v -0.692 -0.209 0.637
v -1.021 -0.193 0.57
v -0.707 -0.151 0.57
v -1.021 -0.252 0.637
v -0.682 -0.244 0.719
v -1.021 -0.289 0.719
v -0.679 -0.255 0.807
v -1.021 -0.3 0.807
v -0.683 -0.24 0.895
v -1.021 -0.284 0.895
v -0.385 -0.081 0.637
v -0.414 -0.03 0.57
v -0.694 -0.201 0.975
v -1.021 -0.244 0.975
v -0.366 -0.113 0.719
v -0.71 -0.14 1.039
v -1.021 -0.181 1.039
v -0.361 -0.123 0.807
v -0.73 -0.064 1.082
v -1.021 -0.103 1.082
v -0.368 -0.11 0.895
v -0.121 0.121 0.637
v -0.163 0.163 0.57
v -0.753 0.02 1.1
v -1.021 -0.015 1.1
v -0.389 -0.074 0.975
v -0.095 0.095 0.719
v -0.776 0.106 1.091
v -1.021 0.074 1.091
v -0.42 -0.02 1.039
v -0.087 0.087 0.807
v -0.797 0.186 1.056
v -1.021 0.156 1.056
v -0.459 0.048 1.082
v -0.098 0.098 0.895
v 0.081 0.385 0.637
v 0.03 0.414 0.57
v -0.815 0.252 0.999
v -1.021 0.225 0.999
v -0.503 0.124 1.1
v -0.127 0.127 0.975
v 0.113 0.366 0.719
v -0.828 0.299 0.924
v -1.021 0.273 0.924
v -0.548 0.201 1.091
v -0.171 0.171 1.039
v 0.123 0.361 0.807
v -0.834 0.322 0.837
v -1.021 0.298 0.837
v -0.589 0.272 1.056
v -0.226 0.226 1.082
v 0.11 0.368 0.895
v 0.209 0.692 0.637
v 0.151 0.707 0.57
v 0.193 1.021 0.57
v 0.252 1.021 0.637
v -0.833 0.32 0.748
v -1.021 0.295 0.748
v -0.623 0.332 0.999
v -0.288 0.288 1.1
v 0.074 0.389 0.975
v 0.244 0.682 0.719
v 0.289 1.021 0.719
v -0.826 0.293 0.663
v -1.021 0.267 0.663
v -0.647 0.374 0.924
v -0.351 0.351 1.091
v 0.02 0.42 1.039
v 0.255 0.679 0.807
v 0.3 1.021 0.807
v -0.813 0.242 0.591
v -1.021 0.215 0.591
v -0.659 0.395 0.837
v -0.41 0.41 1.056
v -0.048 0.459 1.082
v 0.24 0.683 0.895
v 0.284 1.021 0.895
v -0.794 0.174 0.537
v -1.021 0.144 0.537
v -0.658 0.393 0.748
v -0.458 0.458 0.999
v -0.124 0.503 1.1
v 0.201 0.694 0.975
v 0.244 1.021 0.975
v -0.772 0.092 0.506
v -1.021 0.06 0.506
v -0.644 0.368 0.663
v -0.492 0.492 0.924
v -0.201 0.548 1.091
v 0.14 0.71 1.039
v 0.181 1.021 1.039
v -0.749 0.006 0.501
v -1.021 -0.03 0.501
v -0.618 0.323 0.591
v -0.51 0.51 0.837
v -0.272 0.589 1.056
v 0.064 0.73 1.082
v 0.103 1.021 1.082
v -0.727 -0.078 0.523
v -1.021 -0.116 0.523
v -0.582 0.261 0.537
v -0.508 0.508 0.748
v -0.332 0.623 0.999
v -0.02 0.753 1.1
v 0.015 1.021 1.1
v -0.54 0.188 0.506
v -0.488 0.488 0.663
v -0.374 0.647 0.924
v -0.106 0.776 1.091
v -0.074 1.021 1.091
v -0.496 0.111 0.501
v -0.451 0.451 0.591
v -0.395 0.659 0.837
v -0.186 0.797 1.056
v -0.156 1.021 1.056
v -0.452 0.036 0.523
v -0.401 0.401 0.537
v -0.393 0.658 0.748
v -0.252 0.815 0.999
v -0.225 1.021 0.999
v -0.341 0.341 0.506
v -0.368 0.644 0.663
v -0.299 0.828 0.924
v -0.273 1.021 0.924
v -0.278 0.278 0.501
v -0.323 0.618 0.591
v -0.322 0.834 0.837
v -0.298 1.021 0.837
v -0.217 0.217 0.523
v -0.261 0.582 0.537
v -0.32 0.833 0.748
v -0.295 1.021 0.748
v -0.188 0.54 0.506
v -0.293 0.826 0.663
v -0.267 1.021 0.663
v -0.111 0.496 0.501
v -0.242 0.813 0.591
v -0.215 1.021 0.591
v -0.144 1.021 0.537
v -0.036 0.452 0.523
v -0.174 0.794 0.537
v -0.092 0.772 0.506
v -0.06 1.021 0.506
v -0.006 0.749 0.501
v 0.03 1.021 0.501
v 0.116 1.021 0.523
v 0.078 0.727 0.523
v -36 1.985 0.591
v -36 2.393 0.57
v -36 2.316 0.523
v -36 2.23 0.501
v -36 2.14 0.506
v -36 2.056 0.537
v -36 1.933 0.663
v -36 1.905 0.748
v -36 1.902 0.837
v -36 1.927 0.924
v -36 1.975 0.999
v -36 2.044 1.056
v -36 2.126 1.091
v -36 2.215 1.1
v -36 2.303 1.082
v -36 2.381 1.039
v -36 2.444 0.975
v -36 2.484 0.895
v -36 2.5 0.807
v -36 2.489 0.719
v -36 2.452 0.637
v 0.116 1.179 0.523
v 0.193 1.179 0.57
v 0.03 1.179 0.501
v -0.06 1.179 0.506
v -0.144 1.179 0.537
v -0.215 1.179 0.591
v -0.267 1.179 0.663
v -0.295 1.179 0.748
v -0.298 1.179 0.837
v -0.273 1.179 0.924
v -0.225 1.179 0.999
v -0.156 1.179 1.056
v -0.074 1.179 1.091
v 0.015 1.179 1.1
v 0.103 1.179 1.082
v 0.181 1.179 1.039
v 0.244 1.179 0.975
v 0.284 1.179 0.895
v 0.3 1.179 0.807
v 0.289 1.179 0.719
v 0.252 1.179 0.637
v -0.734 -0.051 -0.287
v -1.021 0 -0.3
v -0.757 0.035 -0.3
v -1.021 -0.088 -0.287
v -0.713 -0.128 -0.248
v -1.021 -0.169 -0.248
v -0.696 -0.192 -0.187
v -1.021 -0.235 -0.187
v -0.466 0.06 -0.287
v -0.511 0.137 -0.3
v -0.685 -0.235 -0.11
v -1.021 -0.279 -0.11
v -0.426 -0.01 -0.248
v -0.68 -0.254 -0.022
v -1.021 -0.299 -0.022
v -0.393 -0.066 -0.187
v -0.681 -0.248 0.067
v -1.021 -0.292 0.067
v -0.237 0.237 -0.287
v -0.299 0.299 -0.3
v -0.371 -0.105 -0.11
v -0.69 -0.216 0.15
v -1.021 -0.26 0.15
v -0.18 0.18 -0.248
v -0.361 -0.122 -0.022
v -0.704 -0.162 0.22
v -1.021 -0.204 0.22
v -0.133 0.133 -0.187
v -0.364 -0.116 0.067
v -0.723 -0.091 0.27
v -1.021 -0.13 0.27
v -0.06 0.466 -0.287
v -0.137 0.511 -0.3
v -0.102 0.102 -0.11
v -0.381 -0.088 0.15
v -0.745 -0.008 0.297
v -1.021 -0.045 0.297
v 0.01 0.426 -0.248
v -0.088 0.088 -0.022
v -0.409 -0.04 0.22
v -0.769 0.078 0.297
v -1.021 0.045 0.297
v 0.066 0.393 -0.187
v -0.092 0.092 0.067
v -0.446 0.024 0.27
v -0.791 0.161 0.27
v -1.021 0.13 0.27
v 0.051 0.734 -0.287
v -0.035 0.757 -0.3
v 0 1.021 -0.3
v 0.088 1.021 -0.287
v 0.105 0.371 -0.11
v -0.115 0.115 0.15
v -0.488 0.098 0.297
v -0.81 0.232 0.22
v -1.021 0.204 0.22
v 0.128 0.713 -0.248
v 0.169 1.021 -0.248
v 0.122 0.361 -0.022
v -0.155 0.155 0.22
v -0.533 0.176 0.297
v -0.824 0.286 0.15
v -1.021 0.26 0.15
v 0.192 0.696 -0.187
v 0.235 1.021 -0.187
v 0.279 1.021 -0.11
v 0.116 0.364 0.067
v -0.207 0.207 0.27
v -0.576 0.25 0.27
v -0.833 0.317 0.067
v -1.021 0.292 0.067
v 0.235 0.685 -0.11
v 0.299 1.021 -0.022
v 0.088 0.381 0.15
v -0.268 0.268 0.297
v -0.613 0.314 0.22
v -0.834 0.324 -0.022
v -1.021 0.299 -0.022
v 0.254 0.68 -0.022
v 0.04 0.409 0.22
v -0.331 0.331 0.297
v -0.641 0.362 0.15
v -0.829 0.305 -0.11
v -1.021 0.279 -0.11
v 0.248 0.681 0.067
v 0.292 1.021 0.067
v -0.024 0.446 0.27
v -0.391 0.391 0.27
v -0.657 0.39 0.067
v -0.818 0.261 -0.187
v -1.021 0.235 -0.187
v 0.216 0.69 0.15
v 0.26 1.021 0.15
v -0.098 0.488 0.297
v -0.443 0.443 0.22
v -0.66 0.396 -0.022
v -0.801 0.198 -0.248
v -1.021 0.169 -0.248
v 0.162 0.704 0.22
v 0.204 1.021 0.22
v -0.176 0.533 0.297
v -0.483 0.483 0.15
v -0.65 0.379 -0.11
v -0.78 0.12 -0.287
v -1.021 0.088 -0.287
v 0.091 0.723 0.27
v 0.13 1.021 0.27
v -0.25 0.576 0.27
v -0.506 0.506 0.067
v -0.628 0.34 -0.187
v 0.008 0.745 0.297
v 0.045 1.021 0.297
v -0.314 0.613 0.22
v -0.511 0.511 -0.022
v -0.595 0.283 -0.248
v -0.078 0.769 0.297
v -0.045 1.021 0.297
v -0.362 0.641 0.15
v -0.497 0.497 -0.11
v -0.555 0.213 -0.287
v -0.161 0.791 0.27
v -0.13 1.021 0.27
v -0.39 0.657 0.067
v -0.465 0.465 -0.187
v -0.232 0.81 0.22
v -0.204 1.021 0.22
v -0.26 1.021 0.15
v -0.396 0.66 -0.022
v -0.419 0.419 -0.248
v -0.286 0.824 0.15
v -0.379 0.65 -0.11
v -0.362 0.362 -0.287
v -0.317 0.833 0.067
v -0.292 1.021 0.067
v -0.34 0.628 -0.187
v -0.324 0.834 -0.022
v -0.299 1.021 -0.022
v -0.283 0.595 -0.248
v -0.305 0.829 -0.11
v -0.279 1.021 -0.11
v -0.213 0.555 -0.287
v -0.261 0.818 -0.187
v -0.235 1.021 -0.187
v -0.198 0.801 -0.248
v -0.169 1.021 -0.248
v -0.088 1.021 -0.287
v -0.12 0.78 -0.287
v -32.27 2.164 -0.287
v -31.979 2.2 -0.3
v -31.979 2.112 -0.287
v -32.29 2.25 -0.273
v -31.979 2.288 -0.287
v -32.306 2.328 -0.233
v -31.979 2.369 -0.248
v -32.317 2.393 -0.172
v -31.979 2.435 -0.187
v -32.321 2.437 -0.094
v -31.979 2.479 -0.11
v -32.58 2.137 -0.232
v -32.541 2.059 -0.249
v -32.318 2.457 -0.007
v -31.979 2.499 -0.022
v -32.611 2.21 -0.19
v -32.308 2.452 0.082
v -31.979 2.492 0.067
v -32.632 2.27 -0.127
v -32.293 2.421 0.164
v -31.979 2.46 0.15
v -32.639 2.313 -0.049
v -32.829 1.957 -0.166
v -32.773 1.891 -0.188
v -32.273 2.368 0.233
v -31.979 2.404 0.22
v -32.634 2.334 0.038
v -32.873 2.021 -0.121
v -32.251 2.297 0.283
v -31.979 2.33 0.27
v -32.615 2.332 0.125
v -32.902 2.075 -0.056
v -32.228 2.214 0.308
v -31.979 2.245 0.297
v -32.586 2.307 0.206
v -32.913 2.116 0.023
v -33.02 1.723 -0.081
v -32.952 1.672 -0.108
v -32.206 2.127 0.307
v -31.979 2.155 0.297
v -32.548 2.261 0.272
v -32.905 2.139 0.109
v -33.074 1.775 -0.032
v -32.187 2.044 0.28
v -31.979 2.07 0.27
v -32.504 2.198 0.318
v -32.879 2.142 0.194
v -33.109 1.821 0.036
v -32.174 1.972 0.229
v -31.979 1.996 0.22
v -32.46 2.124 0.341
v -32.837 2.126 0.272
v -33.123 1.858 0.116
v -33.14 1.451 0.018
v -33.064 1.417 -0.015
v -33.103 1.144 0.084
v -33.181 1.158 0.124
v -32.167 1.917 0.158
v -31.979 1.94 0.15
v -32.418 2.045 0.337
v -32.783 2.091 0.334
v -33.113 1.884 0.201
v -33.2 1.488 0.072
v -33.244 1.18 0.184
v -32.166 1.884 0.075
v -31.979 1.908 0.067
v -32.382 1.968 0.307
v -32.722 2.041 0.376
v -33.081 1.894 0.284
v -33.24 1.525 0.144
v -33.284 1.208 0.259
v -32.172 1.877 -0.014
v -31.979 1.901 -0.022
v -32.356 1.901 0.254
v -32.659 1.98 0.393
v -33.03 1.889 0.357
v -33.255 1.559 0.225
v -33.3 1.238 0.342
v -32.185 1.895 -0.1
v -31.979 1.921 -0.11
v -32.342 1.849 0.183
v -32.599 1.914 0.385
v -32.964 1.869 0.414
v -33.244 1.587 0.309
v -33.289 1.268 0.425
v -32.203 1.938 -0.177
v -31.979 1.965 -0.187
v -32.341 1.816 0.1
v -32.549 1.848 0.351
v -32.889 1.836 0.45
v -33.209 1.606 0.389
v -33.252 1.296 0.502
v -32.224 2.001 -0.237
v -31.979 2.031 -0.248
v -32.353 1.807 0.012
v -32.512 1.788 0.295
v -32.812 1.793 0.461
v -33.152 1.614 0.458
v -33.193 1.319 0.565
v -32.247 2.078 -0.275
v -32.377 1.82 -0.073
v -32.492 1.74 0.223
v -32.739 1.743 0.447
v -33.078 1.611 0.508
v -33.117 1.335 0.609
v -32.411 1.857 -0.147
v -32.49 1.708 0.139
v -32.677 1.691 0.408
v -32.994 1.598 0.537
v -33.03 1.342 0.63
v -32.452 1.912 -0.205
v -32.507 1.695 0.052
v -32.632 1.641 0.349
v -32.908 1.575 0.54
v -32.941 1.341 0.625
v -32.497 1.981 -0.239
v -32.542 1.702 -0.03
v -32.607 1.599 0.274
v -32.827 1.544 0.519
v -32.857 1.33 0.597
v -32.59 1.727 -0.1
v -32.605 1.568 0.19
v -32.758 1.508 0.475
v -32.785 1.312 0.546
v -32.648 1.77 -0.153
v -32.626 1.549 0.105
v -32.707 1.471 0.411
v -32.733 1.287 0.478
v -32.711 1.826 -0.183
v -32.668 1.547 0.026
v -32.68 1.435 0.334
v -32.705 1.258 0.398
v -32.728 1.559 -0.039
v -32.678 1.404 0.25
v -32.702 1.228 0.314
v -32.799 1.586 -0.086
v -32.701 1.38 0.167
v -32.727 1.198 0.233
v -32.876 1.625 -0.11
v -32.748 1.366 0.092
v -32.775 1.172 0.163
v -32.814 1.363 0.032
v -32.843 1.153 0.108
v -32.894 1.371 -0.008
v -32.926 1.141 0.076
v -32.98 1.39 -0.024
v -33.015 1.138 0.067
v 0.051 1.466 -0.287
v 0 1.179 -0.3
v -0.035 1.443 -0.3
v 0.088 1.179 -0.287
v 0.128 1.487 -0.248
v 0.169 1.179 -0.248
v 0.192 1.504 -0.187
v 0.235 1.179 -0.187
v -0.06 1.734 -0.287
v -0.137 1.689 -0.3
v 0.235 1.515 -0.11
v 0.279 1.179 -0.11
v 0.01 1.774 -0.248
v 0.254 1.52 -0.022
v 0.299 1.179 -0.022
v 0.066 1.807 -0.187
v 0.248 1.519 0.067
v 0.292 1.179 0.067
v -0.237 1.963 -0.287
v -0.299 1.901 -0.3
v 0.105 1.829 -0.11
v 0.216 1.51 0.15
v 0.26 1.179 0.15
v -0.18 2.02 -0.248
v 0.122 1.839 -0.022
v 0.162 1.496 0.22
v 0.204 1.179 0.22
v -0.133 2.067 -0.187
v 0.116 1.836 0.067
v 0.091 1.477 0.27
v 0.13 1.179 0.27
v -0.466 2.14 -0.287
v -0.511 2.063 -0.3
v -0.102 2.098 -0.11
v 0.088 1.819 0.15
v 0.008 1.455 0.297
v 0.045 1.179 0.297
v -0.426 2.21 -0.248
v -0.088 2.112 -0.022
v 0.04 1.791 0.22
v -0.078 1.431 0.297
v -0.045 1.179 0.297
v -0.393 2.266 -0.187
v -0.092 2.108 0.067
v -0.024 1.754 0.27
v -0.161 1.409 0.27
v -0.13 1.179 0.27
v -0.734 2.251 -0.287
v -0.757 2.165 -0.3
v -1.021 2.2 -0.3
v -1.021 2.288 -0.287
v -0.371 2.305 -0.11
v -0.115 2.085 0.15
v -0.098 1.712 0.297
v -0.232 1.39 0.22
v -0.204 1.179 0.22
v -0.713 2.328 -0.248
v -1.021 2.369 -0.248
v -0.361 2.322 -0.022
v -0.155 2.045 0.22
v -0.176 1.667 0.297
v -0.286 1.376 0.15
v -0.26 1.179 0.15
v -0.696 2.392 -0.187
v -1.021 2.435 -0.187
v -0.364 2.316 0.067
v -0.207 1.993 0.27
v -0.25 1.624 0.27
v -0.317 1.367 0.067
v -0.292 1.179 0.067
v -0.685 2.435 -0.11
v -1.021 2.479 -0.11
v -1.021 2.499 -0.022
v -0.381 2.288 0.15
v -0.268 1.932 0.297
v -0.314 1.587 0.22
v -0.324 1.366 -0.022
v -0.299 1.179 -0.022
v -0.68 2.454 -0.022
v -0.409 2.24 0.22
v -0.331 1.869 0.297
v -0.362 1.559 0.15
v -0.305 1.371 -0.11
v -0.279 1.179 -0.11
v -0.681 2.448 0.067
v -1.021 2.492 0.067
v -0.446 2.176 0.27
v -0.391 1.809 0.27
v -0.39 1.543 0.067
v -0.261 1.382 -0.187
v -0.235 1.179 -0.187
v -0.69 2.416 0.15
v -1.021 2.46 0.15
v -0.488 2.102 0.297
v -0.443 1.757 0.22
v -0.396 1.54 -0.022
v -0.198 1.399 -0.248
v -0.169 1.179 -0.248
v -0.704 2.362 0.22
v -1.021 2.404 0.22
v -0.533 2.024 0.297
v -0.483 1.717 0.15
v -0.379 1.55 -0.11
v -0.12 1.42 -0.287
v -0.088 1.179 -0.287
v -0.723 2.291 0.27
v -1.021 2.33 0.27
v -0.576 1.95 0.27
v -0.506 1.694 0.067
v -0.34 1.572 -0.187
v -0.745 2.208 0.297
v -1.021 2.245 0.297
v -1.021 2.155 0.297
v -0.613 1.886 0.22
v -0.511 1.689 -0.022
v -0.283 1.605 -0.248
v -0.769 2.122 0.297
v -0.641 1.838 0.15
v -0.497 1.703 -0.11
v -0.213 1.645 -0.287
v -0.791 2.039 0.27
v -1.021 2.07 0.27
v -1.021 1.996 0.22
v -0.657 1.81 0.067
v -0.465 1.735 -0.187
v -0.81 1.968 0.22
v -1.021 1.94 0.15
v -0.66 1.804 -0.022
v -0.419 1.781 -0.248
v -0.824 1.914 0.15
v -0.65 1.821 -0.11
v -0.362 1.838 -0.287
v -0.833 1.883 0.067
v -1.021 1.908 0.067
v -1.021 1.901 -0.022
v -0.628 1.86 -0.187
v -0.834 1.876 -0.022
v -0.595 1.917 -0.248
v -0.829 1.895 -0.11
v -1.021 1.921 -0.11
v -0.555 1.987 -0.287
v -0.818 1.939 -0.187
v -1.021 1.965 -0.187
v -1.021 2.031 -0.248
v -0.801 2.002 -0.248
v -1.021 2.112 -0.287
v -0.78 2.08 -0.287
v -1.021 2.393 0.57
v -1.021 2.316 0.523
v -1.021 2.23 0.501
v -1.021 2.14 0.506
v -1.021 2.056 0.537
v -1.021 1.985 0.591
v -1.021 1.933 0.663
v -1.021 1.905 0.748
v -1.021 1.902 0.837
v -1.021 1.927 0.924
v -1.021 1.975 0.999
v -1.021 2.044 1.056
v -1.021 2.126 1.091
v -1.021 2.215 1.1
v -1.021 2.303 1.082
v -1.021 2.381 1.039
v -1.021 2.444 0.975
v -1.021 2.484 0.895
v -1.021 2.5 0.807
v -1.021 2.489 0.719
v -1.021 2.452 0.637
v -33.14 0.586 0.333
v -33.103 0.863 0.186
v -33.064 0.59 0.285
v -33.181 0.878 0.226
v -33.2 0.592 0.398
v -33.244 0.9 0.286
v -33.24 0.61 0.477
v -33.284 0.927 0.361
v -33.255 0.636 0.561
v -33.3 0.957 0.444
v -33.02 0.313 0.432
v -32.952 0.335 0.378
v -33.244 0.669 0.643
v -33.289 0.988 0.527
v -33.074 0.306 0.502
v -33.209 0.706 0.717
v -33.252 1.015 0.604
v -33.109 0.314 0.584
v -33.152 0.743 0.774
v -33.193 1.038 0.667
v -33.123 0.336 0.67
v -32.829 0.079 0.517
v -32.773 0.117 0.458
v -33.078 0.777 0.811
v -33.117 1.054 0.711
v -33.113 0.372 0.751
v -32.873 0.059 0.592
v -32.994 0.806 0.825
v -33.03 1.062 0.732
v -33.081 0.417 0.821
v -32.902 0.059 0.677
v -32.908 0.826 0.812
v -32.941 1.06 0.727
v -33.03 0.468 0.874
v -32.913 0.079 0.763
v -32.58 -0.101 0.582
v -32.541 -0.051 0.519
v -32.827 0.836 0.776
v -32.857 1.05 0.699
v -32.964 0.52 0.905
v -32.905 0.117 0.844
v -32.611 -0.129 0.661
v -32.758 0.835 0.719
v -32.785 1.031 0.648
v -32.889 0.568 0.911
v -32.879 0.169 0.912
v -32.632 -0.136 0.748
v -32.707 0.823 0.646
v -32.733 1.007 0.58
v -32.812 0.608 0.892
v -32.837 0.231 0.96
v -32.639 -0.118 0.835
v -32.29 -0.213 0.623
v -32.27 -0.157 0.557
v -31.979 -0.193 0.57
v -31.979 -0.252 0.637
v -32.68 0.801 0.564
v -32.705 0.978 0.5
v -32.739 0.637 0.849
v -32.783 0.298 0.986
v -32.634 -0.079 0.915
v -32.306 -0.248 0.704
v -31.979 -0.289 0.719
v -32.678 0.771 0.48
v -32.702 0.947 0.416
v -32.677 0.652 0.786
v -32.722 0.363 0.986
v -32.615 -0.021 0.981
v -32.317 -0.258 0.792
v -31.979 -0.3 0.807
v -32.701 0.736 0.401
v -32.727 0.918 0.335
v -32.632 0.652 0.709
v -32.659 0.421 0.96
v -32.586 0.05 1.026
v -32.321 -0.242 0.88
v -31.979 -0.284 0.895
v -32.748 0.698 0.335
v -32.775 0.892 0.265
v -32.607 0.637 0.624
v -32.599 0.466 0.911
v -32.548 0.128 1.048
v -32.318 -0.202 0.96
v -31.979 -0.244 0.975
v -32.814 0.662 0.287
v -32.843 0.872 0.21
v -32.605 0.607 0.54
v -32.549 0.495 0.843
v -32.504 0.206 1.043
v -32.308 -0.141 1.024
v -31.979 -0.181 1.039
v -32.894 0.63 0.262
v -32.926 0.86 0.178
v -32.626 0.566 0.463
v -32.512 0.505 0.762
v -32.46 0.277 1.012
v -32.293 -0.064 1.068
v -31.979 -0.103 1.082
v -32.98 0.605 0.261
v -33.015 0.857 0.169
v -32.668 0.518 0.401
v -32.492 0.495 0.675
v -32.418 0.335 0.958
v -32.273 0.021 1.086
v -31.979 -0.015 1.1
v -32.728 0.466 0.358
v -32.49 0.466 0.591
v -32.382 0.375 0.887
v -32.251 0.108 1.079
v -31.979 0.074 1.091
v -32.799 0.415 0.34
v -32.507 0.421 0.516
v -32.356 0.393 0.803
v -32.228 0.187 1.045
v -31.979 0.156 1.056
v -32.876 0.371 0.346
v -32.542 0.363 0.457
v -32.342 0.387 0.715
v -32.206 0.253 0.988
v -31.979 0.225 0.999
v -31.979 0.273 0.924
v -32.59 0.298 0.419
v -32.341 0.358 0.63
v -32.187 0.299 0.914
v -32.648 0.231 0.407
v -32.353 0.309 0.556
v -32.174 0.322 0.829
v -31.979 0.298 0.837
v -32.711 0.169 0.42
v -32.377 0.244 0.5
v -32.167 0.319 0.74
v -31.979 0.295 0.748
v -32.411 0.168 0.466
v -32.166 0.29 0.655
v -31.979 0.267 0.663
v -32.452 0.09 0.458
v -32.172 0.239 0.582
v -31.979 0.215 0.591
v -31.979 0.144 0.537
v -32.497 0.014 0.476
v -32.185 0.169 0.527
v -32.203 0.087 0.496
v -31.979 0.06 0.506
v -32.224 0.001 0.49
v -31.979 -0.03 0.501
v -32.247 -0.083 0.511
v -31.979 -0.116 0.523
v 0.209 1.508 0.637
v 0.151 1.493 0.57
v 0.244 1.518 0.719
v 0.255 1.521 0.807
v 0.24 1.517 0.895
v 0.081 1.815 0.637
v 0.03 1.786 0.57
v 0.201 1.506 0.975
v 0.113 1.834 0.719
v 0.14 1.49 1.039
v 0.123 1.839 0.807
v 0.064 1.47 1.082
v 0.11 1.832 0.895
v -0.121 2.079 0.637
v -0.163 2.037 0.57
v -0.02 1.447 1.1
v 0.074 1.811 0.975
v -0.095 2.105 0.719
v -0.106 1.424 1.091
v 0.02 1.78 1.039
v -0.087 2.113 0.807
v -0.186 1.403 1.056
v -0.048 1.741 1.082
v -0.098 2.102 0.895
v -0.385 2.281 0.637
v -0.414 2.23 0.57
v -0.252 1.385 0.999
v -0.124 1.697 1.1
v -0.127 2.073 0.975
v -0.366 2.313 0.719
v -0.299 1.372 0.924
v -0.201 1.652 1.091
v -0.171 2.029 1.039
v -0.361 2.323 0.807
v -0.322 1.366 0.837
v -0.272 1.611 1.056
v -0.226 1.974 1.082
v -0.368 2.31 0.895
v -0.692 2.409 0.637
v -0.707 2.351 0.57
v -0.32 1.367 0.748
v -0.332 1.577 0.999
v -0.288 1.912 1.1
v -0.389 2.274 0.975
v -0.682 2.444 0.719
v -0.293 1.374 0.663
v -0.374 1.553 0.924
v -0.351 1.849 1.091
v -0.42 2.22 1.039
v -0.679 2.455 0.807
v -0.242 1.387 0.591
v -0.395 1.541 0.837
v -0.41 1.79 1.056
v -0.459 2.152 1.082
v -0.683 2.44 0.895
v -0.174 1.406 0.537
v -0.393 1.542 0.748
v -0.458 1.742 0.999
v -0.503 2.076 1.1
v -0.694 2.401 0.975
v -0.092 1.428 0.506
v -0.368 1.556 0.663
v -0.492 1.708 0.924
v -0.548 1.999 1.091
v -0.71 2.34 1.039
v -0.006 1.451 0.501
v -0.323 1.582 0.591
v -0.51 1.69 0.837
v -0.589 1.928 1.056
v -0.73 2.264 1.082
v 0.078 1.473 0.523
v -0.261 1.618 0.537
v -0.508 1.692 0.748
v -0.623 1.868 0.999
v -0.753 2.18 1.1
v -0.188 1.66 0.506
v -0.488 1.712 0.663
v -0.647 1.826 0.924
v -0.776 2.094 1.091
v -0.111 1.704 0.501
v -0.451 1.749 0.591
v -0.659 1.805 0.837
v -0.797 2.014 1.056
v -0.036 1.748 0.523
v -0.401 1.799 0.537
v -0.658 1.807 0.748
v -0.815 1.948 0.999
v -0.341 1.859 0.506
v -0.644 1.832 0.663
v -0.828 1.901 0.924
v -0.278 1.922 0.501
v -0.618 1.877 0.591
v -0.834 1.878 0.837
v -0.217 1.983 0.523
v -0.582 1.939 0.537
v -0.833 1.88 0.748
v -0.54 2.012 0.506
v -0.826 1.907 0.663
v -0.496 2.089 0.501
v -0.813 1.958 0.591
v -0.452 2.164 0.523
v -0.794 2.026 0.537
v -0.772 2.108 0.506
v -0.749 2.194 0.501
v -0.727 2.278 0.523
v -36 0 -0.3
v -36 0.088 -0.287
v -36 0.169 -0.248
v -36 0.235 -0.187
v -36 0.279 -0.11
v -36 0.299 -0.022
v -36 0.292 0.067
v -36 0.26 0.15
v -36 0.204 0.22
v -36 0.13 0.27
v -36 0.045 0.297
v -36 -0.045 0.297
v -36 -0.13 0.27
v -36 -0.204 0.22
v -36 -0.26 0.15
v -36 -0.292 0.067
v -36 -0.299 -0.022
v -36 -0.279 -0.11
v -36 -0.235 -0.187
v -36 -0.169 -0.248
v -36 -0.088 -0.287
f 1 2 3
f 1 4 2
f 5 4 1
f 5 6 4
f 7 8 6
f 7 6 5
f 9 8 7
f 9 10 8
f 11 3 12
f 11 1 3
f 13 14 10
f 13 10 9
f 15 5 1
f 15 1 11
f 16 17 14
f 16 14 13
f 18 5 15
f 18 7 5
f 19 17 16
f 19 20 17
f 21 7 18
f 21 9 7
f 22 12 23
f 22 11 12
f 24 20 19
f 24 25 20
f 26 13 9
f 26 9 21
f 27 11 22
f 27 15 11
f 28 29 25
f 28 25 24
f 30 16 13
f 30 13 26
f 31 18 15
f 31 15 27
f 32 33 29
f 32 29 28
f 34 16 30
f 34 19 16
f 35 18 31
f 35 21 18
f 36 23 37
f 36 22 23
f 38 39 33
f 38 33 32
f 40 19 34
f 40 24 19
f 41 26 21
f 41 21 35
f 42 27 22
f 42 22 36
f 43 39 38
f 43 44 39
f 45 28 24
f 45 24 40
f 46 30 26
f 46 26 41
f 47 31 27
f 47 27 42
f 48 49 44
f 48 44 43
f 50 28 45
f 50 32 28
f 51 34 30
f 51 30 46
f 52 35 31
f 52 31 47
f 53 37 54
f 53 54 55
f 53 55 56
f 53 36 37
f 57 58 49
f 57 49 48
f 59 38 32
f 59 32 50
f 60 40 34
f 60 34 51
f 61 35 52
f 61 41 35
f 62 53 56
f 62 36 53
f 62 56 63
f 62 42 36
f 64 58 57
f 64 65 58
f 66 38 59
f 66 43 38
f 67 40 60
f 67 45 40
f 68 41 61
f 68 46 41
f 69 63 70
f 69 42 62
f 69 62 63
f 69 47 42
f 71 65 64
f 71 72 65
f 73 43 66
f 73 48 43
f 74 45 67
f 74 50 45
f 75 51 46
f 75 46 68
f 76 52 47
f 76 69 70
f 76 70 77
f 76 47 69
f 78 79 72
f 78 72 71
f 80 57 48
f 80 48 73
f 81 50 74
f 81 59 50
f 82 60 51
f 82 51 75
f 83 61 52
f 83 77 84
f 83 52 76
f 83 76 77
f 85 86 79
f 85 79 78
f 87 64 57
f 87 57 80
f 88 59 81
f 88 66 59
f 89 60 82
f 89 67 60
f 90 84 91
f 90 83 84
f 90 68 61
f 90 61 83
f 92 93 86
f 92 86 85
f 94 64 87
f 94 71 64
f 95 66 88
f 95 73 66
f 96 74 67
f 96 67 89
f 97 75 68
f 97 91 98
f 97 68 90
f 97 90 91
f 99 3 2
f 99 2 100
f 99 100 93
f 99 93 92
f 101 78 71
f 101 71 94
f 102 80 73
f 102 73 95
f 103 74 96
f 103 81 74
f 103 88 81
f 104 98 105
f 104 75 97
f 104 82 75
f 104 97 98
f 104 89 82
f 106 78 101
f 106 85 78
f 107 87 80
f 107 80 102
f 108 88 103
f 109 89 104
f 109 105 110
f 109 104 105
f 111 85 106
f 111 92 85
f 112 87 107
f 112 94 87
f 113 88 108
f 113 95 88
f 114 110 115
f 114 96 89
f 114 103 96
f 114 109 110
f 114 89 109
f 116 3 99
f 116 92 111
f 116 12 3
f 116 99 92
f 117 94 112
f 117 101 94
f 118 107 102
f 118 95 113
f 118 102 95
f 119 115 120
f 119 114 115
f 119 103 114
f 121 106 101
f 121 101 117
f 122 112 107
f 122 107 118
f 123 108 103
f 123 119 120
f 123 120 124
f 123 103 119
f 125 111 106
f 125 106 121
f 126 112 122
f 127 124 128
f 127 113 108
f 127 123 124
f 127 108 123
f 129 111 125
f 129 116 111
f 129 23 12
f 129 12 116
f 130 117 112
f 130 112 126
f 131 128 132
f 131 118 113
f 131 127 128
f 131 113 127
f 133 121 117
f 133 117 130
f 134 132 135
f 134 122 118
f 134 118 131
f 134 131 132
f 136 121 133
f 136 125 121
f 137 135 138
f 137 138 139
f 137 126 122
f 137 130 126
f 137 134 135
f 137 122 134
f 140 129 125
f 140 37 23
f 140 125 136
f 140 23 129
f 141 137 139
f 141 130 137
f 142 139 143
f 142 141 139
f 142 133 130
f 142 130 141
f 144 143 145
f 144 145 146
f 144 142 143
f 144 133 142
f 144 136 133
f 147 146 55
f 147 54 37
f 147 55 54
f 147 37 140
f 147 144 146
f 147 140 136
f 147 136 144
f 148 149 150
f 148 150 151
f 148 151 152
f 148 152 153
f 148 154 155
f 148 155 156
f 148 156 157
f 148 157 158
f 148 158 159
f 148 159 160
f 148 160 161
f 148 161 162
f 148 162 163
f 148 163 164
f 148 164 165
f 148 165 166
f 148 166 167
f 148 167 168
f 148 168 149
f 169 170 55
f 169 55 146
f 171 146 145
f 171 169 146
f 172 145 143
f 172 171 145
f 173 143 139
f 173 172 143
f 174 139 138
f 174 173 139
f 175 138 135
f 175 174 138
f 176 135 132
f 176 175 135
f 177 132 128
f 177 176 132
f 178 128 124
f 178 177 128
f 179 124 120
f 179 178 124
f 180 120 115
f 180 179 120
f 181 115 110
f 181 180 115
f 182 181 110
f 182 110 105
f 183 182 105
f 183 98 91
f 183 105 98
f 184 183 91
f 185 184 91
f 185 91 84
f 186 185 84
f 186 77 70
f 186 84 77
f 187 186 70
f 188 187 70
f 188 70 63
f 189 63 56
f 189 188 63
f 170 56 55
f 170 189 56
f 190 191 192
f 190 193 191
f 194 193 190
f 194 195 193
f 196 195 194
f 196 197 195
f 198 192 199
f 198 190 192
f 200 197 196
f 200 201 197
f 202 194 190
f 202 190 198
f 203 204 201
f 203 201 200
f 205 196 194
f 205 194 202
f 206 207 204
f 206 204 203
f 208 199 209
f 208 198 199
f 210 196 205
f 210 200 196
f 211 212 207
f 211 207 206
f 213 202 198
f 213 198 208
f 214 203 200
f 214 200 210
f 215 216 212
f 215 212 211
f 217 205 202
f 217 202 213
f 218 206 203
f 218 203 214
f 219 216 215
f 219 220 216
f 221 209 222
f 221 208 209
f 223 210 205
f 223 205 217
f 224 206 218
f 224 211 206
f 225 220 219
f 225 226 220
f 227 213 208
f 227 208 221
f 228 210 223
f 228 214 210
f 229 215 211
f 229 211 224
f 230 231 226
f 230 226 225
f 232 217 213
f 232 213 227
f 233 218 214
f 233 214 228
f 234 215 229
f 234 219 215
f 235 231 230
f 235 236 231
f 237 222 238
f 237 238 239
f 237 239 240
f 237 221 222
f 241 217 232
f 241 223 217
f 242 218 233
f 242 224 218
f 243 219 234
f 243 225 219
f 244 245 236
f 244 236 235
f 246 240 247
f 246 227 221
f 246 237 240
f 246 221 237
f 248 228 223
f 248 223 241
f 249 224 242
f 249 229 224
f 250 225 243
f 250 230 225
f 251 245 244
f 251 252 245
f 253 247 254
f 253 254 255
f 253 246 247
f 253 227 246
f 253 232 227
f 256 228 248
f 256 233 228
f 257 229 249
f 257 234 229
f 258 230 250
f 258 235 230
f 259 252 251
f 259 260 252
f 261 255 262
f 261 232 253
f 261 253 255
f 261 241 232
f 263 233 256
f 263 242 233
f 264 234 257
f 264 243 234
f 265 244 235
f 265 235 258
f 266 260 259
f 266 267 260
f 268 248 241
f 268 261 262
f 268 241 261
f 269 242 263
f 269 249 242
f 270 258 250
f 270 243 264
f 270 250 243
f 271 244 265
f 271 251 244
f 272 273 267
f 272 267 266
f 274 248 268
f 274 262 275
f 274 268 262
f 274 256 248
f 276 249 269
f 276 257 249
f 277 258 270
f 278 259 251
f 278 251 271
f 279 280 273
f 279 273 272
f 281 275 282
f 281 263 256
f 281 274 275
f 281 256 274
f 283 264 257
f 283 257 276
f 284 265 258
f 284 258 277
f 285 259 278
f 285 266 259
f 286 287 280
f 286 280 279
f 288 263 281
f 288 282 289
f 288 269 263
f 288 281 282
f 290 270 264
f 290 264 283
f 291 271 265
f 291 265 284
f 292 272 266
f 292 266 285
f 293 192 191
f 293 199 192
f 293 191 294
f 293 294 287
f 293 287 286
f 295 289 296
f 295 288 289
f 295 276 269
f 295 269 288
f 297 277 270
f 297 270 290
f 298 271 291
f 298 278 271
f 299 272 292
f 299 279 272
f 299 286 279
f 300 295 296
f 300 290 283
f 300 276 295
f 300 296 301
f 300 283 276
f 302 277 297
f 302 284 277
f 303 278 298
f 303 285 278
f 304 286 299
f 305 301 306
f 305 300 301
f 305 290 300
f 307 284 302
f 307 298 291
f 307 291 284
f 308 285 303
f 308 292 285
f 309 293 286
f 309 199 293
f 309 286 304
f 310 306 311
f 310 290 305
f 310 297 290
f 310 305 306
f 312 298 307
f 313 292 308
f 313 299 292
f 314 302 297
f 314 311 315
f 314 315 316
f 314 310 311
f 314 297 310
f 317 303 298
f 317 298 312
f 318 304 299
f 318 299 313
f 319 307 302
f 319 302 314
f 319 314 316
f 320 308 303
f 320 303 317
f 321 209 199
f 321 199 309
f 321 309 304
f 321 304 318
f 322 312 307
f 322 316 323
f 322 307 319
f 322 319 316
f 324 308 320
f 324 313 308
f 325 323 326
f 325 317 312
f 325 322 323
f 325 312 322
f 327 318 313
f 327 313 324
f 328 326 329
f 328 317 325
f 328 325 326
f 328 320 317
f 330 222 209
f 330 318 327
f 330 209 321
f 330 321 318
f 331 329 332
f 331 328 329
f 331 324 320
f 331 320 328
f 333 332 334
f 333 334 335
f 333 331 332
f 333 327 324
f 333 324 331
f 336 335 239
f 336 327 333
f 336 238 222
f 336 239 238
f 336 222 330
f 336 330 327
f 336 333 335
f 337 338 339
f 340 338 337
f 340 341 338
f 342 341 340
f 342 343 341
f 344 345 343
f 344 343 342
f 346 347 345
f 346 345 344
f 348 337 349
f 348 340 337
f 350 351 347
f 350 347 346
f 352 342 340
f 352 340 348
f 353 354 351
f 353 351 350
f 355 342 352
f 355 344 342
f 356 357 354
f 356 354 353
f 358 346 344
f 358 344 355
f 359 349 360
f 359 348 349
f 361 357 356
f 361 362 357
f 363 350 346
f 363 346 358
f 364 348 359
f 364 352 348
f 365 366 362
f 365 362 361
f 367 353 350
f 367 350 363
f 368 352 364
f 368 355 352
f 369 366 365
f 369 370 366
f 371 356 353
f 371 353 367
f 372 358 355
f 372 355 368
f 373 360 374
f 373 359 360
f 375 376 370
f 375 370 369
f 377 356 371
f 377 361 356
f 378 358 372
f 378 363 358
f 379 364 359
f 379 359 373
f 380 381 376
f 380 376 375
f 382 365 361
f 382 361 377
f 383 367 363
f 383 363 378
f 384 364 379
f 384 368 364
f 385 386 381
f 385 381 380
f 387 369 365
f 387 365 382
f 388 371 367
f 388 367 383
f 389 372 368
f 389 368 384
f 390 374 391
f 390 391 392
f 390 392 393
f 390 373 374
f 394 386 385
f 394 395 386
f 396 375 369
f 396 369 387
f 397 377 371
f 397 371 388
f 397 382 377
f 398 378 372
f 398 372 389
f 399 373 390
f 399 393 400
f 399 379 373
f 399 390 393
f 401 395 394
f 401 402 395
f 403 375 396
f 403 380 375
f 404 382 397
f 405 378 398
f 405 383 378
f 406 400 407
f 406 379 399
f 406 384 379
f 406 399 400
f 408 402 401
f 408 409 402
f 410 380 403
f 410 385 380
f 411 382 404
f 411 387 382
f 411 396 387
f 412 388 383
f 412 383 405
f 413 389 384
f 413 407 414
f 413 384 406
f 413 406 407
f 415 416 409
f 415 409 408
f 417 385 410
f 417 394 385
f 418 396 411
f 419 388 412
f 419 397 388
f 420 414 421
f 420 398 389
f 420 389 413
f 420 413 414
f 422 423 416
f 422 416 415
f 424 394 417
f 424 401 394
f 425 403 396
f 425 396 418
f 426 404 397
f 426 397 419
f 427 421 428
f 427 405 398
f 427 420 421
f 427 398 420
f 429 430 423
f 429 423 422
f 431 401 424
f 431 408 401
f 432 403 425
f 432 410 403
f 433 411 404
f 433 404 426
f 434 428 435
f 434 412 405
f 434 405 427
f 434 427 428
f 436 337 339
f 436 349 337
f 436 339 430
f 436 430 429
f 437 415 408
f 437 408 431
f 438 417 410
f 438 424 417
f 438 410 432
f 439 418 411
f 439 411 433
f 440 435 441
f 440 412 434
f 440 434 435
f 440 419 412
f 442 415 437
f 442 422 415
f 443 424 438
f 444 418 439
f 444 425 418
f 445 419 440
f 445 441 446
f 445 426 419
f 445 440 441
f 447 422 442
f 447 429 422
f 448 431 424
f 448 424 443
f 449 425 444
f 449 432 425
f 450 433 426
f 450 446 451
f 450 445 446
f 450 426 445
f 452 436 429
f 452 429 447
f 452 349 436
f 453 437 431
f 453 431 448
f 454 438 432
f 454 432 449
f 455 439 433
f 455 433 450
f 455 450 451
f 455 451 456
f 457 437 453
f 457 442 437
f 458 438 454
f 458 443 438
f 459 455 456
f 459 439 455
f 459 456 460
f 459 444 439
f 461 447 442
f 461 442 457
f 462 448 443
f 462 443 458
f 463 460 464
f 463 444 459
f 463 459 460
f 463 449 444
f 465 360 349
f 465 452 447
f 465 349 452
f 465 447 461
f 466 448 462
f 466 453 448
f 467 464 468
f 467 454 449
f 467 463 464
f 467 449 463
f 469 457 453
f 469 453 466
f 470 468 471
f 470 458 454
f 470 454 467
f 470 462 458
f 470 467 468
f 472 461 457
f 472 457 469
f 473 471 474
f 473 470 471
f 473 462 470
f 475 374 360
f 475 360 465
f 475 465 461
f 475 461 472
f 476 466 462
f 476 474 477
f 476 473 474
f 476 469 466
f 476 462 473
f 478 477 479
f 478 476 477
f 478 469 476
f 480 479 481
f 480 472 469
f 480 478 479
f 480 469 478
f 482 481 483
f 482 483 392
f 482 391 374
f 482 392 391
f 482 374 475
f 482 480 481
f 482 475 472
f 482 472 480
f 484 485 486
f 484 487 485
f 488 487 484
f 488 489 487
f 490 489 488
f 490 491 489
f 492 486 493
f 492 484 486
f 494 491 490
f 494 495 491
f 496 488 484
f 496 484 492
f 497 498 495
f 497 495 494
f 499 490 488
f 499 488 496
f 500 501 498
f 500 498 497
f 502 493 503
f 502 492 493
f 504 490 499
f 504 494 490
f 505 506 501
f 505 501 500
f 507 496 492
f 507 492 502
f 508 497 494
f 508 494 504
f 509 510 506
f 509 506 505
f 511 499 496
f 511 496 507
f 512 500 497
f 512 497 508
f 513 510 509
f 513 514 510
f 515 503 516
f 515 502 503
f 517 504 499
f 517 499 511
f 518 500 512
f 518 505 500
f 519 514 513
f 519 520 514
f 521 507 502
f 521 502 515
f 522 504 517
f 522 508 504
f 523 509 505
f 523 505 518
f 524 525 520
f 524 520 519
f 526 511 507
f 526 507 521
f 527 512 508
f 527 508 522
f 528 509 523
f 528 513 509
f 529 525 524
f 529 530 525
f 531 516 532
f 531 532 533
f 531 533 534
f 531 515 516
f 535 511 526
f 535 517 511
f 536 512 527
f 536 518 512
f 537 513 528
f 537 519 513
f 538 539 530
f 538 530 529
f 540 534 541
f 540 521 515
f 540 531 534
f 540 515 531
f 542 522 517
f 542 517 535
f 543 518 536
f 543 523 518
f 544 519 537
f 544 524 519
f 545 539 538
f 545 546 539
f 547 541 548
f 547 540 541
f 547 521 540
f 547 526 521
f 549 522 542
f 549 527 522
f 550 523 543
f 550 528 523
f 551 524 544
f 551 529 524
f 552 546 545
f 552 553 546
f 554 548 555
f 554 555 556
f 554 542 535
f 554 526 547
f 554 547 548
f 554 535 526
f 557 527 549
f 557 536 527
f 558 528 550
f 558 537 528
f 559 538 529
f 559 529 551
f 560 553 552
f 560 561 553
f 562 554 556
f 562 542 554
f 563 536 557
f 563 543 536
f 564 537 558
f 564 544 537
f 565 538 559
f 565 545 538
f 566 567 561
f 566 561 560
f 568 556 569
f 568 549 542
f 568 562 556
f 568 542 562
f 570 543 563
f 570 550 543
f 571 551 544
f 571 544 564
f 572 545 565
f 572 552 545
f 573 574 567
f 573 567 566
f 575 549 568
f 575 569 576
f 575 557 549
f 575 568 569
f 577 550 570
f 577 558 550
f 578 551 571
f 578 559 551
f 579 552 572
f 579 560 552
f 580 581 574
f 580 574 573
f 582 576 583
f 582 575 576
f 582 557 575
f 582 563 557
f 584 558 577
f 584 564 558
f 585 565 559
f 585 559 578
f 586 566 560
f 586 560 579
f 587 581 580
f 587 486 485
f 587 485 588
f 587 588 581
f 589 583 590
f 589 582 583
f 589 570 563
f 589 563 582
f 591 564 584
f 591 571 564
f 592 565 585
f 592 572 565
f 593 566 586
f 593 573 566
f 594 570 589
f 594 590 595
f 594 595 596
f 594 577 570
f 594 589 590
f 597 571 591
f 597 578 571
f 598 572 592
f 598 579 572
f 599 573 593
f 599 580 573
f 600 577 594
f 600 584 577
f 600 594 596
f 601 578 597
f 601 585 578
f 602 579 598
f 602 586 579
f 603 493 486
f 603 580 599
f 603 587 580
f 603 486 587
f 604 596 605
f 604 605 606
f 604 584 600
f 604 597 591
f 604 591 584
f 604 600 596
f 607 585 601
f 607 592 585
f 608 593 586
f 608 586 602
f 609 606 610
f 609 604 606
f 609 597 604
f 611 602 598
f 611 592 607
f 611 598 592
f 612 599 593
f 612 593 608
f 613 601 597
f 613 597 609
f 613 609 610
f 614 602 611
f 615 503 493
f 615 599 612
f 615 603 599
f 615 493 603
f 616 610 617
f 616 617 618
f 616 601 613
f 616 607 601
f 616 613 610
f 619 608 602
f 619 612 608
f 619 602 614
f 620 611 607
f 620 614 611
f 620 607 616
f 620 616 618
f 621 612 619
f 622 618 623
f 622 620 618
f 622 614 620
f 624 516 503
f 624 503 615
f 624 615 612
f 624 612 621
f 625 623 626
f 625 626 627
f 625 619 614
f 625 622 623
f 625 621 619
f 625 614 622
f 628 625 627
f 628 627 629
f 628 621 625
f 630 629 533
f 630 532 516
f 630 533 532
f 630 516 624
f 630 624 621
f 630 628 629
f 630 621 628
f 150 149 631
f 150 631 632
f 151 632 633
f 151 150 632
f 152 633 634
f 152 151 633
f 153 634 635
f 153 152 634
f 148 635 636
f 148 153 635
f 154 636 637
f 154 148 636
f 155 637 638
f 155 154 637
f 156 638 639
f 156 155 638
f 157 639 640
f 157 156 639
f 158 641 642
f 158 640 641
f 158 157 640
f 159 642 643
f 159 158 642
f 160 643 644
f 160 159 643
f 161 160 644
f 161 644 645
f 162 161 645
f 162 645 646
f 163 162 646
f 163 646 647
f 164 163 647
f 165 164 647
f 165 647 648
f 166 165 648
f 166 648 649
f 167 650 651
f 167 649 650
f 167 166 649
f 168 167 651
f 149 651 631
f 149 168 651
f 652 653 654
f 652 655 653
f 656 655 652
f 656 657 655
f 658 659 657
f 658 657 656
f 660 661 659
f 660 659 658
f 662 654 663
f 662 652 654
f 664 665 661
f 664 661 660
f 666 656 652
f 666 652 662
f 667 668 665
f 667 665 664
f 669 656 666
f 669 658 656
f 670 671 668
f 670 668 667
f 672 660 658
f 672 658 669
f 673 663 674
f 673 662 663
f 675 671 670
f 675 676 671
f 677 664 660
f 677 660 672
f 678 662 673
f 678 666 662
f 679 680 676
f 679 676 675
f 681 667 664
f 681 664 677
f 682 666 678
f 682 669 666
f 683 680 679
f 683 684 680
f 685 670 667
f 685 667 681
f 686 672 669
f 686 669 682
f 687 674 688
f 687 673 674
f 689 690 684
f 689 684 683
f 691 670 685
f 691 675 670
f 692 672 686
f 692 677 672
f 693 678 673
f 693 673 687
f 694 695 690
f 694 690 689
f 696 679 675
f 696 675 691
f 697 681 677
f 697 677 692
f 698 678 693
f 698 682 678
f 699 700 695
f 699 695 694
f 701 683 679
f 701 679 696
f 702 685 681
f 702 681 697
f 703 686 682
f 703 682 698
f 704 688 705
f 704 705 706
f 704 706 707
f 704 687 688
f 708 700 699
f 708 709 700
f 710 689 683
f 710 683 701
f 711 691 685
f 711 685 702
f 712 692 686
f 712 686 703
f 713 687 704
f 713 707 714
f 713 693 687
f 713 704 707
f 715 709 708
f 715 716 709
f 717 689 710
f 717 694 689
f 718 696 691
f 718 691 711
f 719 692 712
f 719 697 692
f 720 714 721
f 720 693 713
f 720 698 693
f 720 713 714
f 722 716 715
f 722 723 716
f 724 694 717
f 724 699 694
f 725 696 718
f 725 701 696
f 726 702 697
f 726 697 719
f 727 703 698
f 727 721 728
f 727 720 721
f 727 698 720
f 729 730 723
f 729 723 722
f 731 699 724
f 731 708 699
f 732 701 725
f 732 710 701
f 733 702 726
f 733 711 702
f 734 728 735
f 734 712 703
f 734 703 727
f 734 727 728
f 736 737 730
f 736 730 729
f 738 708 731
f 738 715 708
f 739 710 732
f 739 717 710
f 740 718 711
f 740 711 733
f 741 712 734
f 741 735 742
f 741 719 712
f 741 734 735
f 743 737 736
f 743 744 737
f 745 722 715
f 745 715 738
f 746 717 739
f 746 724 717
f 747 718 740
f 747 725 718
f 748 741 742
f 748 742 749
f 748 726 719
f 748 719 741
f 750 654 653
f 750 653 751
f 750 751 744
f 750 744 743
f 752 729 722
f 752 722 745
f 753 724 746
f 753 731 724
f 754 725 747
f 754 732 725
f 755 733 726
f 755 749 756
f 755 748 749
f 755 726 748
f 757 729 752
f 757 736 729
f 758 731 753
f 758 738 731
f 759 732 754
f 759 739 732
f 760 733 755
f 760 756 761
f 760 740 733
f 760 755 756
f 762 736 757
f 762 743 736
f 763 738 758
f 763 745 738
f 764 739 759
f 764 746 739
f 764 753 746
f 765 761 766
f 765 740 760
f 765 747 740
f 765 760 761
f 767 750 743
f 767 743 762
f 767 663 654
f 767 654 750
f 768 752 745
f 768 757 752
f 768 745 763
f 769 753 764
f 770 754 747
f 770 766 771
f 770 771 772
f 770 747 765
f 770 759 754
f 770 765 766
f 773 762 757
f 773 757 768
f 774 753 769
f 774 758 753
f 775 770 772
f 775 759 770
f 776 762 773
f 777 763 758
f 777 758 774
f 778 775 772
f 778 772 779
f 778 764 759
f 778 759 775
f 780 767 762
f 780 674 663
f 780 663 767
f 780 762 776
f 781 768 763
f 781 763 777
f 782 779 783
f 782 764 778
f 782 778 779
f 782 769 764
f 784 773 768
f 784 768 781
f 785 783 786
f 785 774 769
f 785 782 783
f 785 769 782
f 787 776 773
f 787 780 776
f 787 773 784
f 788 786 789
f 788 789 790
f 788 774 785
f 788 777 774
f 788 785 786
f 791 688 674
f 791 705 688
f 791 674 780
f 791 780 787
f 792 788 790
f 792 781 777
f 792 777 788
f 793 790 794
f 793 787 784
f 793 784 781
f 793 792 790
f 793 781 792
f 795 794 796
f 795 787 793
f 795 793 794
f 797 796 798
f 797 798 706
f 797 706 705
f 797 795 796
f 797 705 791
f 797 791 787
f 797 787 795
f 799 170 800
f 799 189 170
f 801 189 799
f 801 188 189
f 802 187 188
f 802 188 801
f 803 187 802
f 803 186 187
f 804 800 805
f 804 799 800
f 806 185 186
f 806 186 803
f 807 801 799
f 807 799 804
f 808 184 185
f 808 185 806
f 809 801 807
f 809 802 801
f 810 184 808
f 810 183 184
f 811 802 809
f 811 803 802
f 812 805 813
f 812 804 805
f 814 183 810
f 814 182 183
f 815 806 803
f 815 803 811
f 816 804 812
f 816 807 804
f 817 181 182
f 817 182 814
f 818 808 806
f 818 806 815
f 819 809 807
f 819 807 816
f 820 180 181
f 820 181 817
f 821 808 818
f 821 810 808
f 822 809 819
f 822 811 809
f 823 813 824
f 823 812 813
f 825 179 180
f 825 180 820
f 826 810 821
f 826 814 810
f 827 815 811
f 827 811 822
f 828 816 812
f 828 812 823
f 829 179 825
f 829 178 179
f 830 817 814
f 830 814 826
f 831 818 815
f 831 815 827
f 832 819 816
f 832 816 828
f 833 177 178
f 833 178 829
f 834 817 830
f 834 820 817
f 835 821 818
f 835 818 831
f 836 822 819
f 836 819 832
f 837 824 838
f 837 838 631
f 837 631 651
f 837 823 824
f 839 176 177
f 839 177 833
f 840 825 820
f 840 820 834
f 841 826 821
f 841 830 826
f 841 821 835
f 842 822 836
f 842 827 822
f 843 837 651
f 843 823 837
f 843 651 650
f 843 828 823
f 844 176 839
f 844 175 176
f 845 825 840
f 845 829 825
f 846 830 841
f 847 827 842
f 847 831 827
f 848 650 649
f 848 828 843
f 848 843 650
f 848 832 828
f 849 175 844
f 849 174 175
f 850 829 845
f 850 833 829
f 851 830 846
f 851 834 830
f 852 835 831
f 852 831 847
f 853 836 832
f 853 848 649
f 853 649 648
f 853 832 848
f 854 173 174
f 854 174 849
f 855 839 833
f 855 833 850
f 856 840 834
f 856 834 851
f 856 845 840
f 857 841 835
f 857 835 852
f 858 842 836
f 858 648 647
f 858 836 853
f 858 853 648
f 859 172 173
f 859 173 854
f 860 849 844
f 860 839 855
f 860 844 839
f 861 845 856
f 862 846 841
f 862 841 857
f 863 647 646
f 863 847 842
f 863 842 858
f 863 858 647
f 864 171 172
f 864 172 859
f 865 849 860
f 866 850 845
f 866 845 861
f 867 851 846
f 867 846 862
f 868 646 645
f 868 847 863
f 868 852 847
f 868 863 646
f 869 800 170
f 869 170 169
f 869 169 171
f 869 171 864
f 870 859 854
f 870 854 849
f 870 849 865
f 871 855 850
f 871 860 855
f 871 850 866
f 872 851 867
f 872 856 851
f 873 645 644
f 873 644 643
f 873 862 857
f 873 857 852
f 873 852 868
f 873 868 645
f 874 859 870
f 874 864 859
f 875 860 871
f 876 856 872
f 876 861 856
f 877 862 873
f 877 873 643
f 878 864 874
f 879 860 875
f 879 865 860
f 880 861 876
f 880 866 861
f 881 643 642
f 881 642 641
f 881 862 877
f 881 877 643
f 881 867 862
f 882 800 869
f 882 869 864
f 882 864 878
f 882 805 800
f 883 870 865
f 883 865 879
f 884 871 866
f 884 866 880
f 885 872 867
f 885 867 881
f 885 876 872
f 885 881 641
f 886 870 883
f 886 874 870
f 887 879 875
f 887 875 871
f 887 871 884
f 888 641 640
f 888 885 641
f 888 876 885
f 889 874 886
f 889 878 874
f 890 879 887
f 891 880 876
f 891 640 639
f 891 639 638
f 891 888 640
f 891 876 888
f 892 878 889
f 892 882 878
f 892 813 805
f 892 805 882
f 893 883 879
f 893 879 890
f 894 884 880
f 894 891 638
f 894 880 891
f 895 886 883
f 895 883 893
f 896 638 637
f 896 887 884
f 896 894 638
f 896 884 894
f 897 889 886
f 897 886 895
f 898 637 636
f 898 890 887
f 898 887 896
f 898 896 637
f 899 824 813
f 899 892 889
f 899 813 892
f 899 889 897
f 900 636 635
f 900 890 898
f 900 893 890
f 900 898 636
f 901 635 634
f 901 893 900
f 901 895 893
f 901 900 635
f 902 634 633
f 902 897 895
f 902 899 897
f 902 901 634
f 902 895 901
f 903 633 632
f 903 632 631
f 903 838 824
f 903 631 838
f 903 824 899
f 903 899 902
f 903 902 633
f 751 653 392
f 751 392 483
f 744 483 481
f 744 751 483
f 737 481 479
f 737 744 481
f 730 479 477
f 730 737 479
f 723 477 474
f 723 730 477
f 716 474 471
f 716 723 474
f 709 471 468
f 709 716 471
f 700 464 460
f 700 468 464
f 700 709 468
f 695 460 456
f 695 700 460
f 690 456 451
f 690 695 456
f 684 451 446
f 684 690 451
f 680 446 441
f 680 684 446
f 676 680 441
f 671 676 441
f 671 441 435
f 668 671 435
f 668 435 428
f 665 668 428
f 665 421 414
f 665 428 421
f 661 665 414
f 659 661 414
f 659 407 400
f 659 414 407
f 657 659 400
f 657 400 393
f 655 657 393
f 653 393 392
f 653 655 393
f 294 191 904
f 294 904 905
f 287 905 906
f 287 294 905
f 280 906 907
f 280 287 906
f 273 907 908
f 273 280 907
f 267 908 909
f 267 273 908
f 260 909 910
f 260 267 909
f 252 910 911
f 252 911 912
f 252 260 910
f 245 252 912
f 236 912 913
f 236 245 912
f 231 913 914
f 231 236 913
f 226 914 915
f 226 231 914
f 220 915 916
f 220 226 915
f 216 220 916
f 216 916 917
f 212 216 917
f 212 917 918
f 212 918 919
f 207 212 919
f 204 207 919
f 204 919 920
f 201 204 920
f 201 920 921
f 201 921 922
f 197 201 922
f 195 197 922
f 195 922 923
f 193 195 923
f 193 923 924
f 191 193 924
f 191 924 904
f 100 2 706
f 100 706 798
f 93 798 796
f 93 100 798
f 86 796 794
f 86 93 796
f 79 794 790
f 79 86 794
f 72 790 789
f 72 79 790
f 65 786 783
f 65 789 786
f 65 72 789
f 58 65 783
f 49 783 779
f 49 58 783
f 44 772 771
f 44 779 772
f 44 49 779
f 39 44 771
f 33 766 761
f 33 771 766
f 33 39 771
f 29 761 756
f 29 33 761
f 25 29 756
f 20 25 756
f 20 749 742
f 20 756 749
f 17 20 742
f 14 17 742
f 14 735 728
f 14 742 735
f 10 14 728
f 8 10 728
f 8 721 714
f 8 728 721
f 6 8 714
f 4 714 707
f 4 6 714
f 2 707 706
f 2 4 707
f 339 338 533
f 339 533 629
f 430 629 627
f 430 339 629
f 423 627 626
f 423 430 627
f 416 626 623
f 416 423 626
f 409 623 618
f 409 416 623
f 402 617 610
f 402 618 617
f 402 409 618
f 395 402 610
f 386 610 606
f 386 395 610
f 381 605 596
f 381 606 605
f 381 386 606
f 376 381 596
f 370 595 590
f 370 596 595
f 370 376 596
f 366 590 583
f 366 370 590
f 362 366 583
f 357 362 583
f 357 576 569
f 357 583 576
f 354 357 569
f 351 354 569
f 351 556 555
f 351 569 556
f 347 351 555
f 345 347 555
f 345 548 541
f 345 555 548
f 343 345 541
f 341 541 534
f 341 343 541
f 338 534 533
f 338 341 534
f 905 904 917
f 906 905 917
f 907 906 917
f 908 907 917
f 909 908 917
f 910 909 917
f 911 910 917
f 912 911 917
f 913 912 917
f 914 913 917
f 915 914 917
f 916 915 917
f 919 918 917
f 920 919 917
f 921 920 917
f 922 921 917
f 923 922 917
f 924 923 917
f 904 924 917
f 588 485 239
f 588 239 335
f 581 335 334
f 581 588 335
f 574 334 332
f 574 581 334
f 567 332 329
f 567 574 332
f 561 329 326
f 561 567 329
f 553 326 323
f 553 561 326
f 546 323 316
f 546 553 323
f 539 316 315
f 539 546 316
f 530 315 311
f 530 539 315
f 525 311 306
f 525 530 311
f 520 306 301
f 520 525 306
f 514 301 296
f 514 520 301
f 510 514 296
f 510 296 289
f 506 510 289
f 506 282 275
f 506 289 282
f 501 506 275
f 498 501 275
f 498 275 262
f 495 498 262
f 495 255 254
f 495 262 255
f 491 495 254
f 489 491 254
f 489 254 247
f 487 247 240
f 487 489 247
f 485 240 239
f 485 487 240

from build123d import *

# Parameters (mm, degrees)
SKETCH5_R = 0.3


with BuildPart() as part:
    # Sweep4: sweep along a curve in space
    with BuildLine() as sweep4_path:
        Line((-36, 0, 0), (-1.021255708, 0, 0))
        ThreePointArc((-1.021255708, 0, 0), (-0.299118872, 0.299118872, 0), (0, 1.021255708, 0))
        Line((0, 1.021255708, 0), (0, 1.178744292, 0))
        ThreePointArc((-1.021255708, 2.2, 0), (-0.299118872, 1.900881128, 0), (0, 1.178744292, 0))
        Line((-1.021255708, 2.2, 0), (-31.978744292, 2.2, 0))
        ThreePointArc((-31.978744292, 2.2, 0), (-32.700881128, 1.918890052, 0.102221799), (-33, 1.240230602, 0.349007054))
        Line((-33, 1.240230602, 0.349007054), (-33, 0.959769398, 0.450992946))
        ThreePointArc((-33, 0.959769398, 0.450992946), (-32.700881128, 0.281109948, 0.6977782), (-31.978744292, 0, 0.8))
        Line((-31.978744292, 0, 0.8), (-1.021255708, 0, 0.8))
        ThreePointArc((-1.021255708, 0, 0.8), (-0.299118872, 0.299118872, 0.8), (0, 1.021255708, 0.8))
        Line((0, 1.021255708, 0.8), (0, 1.178744292, 0.8))
        ThreePointArc((0, 1.178744292, 0.8), (-0.299118872, 1.900881128, 0.8), (-1.021255708, 2.2, 0.8))
        Line((-1.021255708, 2.2, 0.8), (-36, 2.2, 0.8))
    # Sketch5 → Sweep4 (sweep)
    with BuildSketch(Plane(origin=(-36, 0, 0), x_dir=(0, 0, -1), z_dir=(1, 0, 0))):
        Circle(SKETCH5_R)
    sweep(path=sweep4_path.line)


solid = part.part
